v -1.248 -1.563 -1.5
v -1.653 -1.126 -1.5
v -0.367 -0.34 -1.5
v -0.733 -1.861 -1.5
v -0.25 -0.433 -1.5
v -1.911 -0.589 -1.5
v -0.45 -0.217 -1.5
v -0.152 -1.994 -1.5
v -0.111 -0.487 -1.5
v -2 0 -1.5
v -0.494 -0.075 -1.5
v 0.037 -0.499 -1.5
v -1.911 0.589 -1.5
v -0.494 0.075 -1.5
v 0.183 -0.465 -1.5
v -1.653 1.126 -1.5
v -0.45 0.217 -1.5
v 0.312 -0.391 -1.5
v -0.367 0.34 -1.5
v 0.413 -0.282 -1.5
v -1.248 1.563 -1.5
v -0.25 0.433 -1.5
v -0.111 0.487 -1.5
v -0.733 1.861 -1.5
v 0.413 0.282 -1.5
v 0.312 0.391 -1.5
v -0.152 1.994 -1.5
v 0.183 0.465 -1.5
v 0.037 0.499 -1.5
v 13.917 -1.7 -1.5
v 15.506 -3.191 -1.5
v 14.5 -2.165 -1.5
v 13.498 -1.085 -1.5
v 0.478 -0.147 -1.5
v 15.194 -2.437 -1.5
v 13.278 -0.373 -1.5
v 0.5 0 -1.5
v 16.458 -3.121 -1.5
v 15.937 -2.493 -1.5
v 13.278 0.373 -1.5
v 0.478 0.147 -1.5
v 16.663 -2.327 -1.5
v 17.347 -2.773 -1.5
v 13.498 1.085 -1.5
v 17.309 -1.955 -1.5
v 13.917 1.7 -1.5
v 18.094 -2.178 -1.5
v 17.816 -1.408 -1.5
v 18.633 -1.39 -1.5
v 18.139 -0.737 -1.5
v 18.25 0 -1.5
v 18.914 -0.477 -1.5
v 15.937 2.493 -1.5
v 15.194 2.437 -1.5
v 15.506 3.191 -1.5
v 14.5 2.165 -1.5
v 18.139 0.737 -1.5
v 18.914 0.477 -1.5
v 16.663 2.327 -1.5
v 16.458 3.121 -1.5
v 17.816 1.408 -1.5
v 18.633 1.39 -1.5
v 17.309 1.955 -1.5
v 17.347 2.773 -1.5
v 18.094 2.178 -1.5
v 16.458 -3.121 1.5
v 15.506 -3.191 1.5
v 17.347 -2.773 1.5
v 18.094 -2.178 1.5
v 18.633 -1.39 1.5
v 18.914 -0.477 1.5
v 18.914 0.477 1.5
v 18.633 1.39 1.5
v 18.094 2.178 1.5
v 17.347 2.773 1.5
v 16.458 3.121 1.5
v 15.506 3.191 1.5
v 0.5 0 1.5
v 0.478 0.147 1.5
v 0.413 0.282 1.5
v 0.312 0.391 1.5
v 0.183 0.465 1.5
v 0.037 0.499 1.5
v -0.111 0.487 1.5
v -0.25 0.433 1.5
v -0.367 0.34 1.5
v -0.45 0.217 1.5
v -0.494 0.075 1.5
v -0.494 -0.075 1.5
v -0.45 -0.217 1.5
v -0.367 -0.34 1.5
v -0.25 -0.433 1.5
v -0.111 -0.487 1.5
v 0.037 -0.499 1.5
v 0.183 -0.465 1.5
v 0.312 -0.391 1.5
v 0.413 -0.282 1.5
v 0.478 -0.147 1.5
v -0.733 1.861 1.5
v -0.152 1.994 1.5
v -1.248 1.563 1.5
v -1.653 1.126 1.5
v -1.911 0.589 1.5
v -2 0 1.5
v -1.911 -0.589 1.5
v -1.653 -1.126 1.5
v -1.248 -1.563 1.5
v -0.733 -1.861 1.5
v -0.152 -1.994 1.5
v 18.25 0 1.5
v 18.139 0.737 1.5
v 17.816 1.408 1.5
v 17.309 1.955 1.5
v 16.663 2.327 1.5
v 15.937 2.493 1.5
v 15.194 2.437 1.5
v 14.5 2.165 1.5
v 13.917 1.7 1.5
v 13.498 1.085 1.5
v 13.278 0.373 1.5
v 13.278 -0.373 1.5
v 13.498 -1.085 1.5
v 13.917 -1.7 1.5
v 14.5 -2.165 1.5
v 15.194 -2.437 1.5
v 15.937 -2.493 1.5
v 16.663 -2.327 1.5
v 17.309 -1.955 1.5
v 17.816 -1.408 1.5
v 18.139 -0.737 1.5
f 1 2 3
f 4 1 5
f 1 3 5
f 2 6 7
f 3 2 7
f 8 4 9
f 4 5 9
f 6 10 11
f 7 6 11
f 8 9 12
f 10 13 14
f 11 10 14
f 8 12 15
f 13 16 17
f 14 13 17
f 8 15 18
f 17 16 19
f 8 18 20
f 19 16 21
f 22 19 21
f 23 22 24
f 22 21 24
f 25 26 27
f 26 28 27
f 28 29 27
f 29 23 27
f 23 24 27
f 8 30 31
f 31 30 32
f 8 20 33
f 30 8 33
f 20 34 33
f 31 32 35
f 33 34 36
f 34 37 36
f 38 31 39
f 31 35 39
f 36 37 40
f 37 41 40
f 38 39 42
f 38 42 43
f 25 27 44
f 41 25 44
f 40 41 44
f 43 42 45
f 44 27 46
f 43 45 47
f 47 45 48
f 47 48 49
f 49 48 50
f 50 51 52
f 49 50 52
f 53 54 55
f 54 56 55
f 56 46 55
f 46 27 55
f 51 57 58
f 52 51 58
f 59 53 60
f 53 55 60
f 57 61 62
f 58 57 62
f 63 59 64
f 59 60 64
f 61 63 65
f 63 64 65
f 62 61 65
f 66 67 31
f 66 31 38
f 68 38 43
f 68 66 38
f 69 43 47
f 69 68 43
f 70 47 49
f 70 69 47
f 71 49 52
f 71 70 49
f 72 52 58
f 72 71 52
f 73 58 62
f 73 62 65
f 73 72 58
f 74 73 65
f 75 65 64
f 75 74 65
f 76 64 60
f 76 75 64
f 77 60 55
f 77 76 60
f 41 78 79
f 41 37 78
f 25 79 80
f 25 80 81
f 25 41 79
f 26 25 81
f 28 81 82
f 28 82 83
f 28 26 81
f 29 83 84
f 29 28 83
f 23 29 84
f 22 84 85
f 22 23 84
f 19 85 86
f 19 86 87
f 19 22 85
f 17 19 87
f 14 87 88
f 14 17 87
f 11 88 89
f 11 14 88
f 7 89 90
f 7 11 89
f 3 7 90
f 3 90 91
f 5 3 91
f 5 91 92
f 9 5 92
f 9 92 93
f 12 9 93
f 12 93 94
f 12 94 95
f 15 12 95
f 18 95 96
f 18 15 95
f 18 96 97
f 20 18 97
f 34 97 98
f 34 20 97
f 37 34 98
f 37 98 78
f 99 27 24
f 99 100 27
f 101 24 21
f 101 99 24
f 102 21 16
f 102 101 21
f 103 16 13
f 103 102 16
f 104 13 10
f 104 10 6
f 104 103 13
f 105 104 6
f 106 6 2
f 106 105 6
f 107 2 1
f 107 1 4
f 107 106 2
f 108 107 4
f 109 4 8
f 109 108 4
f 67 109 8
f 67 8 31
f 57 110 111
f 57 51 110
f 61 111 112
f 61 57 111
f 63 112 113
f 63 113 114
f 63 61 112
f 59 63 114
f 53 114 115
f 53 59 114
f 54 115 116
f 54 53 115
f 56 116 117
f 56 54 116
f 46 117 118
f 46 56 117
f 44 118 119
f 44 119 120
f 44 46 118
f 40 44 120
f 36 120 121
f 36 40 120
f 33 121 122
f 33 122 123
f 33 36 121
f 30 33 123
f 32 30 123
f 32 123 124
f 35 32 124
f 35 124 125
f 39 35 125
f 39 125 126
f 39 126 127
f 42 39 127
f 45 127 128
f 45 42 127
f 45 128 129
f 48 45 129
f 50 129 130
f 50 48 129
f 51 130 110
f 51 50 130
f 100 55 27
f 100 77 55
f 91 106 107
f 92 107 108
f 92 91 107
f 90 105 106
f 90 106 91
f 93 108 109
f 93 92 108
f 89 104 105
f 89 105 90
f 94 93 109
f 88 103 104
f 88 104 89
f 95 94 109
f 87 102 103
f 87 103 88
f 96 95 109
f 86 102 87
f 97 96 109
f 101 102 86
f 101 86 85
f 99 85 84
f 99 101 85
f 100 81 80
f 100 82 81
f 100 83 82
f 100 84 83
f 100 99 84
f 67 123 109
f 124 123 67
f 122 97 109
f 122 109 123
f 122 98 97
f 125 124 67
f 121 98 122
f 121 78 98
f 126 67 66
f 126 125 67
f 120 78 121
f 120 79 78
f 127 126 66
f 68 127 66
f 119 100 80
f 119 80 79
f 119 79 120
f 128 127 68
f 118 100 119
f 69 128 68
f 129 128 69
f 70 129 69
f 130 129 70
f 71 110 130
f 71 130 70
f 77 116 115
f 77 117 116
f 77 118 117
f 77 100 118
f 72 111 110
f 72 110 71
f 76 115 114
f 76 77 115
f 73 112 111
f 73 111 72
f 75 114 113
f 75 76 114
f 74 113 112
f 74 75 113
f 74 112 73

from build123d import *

# Parameters (mm, degrees)
CROQUIS2_R              = 2.5
CROQUIS2_R_2            = 0.5
SALIENTE_EXTRUIR1_DEPTH = 1.5


with BuildPart() as part:
    # Croquis2 → Saliente-Extruir1 (new, symmetric)
    with BuildSketch(Plane.XY):
        with BuildLine():
            ThreePointArc((-0.152380952, 1.994186562), (-2, 0), (-0.152380952, -1.994186562))
            Line((-0.152380952, -1.994186562), (15.506190476, -3.1906985))
            ThreePointArc((15.506190476, -3.1906985), (18.95, 0), (15.506190476, 3.1906985))
            Line((15.506190476, 3.1906985), (-0.152380952, 1.994186562))
        make_face()
        with Locations((15.75, 0)):
            Circle(CROQUIS2_R, mode=Mode.SUBTRACT)
        Circle(CROQUIS2_R_2, mode=Mode.SUBTRACT)
    extrude(amount=SALIENTE_EXTRUIR1_DEPTH, both=True)


solid = part.part
